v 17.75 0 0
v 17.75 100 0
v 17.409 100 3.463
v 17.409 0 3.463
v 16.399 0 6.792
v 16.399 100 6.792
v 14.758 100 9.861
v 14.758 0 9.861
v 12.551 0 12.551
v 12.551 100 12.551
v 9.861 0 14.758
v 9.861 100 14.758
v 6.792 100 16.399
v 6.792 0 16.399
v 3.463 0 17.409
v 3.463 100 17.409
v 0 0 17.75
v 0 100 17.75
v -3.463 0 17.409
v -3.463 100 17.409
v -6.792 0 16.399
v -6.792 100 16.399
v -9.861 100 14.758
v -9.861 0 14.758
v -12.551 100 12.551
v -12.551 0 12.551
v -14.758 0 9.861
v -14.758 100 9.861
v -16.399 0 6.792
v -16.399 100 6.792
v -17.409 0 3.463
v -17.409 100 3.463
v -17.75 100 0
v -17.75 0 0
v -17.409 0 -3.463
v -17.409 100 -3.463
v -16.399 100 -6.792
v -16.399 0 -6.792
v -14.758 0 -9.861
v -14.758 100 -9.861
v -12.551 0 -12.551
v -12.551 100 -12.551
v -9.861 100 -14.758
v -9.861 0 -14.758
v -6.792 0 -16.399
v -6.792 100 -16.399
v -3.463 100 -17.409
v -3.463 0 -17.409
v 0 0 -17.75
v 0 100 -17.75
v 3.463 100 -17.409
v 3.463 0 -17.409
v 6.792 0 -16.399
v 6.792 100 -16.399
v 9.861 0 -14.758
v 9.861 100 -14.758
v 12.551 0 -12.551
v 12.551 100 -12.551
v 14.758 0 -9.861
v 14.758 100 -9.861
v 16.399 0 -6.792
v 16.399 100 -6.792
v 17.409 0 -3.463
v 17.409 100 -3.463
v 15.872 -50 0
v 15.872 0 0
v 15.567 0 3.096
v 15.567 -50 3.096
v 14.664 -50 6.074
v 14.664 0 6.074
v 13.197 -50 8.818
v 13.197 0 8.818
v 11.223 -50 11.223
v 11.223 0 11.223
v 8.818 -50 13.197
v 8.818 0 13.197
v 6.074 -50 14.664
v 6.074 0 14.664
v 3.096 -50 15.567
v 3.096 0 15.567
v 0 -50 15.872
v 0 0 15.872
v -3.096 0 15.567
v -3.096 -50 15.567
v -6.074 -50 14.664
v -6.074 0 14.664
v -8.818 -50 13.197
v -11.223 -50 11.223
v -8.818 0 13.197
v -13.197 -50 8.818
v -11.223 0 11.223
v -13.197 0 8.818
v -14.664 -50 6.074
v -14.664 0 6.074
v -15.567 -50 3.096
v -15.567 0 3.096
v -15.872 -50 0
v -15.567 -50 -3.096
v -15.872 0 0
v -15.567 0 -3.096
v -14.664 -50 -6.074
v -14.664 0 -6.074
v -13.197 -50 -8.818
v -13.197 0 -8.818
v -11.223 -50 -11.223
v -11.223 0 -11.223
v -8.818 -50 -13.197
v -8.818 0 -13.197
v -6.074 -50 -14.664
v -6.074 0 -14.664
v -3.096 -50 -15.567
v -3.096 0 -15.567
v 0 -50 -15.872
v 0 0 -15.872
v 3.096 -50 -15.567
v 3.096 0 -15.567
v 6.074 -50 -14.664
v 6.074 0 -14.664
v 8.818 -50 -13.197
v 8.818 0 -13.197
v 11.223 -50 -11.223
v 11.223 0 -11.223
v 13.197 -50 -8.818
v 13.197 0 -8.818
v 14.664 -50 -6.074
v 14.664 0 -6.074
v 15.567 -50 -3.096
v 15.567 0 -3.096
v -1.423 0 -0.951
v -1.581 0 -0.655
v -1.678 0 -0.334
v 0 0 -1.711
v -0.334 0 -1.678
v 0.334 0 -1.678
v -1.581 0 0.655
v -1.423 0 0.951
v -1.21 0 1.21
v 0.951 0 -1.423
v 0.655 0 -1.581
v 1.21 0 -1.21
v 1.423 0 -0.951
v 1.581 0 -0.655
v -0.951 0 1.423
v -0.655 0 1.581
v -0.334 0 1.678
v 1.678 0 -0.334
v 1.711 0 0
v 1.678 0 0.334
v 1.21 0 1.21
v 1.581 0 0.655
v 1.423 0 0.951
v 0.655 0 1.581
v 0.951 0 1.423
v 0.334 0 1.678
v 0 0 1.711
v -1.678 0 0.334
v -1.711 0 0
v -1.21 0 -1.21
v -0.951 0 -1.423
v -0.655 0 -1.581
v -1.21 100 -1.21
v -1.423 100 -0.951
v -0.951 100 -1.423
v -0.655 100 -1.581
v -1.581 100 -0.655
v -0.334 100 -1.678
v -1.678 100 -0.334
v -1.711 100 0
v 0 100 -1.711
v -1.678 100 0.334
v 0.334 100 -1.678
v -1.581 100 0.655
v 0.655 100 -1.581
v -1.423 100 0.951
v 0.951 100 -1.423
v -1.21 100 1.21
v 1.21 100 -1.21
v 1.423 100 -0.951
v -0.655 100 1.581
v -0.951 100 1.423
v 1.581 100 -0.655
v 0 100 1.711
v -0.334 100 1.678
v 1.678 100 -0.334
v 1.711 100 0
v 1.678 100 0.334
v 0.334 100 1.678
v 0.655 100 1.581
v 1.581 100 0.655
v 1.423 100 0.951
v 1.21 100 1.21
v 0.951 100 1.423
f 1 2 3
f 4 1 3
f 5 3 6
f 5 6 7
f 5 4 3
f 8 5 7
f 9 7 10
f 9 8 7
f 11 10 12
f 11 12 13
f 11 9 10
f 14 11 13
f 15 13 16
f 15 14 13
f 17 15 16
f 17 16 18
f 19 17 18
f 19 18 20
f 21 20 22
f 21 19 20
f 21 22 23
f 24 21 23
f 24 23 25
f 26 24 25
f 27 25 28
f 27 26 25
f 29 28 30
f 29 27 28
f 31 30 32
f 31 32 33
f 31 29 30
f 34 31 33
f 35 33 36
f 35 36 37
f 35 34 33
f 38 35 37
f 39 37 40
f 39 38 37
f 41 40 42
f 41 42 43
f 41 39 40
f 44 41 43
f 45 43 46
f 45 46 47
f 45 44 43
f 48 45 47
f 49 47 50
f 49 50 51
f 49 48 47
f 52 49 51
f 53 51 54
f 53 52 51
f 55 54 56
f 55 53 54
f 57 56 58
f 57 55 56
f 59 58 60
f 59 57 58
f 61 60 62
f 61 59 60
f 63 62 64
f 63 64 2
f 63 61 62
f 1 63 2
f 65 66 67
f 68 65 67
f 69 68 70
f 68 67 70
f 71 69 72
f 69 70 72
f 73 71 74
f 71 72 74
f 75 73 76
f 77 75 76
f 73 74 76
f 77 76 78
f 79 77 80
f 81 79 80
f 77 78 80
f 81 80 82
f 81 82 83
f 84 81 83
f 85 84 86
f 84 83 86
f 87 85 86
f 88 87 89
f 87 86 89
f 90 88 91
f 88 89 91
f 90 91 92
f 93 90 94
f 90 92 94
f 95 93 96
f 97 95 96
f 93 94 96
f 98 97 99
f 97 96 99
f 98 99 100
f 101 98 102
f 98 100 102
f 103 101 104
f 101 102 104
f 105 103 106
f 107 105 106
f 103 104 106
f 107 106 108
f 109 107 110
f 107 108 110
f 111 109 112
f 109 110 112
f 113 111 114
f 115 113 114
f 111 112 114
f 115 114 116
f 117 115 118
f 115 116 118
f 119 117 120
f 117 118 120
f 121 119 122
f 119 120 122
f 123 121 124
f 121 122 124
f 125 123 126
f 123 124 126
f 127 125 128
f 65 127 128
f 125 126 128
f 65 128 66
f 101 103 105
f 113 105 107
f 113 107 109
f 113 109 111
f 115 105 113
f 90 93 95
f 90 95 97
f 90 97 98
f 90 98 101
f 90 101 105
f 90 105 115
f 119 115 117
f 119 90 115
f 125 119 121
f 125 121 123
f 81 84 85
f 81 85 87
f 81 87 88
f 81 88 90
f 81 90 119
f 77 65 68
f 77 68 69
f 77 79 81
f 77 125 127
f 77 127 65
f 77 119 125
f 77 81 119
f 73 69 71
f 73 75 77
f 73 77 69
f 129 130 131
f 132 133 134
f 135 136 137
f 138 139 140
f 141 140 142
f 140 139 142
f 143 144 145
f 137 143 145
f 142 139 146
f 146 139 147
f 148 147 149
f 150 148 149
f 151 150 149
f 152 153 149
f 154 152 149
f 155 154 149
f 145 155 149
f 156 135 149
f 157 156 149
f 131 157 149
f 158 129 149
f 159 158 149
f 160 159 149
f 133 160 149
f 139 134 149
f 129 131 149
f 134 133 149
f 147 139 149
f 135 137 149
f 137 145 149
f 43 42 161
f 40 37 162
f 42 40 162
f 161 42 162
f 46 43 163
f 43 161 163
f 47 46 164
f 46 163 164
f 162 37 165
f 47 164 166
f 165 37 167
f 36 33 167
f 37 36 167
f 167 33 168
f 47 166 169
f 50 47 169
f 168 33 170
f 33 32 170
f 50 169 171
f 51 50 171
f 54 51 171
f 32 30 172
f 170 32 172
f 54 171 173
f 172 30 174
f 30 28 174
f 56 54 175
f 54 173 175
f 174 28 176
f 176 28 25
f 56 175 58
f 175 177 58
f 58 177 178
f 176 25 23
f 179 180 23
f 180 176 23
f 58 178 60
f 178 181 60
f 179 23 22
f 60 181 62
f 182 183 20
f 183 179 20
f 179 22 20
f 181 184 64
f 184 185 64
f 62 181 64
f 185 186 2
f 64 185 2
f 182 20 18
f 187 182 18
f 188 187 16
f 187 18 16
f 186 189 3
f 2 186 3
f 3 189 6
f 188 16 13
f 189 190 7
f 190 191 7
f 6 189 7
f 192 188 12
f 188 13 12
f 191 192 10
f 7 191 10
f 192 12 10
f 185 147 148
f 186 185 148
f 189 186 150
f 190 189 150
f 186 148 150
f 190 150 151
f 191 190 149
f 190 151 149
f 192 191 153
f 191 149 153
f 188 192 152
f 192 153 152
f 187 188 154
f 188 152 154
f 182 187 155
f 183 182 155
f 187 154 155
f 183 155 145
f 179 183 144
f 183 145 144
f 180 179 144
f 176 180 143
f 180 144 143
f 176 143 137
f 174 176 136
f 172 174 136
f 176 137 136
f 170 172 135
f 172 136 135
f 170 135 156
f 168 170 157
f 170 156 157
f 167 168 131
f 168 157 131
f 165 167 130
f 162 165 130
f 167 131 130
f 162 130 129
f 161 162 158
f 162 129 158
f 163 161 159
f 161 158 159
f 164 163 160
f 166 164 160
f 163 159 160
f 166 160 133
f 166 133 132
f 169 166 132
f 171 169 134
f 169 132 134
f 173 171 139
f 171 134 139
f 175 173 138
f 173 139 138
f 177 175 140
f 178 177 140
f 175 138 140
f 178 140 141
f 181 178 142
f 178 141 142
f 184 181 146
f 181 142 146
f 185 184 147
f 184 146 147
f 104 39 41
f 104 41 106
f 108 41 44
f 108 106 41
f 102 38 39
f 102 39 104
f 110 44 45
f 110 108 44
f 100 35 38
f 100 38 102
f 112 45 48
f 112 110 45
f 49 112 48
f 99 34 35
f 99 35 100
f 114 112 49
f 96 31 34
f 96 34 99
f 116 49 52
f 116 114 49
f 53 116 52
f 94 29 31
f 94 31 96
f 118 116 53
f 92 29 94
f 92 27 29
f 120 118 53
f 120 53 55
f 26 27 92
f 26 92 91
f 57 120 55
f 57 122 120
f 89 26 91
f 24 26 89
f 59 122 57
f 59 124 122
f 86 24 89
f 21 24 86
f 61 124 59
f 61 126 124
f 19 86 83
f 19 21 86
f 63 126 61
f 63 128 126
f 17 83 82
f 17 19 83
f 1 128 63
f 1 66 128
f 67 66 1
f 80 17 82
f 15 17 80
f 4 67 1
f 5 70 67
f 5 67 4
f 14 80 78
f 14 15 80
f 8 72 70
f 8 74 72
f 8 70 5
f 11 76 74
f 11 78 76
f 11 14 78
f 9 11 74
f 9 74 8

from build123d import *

# Parameters (mm, degrees)
F0_R     = 17.749636
F0_R_2   = 1.710975
F1_DEPTH = 100
F2_R     = 15.871691
F3_DEPTH = 50


with BuildPart() as f1:
    # F0 (on Front) → F1 (new body)
    with BuildSketch(Plane.XZ):
        Circle(F0_R)
        Circle(F0_R_2, mode=Mode.SUBTRACT)
    extrude(amount=-F1_DEPTH)

    # F2 (on Front) → F3 (join)
    with BuildSketch(Plane.XZ):
        Circle(F2_R)
    extrude(amount=F3_DEPTH)


solid = f1.part
